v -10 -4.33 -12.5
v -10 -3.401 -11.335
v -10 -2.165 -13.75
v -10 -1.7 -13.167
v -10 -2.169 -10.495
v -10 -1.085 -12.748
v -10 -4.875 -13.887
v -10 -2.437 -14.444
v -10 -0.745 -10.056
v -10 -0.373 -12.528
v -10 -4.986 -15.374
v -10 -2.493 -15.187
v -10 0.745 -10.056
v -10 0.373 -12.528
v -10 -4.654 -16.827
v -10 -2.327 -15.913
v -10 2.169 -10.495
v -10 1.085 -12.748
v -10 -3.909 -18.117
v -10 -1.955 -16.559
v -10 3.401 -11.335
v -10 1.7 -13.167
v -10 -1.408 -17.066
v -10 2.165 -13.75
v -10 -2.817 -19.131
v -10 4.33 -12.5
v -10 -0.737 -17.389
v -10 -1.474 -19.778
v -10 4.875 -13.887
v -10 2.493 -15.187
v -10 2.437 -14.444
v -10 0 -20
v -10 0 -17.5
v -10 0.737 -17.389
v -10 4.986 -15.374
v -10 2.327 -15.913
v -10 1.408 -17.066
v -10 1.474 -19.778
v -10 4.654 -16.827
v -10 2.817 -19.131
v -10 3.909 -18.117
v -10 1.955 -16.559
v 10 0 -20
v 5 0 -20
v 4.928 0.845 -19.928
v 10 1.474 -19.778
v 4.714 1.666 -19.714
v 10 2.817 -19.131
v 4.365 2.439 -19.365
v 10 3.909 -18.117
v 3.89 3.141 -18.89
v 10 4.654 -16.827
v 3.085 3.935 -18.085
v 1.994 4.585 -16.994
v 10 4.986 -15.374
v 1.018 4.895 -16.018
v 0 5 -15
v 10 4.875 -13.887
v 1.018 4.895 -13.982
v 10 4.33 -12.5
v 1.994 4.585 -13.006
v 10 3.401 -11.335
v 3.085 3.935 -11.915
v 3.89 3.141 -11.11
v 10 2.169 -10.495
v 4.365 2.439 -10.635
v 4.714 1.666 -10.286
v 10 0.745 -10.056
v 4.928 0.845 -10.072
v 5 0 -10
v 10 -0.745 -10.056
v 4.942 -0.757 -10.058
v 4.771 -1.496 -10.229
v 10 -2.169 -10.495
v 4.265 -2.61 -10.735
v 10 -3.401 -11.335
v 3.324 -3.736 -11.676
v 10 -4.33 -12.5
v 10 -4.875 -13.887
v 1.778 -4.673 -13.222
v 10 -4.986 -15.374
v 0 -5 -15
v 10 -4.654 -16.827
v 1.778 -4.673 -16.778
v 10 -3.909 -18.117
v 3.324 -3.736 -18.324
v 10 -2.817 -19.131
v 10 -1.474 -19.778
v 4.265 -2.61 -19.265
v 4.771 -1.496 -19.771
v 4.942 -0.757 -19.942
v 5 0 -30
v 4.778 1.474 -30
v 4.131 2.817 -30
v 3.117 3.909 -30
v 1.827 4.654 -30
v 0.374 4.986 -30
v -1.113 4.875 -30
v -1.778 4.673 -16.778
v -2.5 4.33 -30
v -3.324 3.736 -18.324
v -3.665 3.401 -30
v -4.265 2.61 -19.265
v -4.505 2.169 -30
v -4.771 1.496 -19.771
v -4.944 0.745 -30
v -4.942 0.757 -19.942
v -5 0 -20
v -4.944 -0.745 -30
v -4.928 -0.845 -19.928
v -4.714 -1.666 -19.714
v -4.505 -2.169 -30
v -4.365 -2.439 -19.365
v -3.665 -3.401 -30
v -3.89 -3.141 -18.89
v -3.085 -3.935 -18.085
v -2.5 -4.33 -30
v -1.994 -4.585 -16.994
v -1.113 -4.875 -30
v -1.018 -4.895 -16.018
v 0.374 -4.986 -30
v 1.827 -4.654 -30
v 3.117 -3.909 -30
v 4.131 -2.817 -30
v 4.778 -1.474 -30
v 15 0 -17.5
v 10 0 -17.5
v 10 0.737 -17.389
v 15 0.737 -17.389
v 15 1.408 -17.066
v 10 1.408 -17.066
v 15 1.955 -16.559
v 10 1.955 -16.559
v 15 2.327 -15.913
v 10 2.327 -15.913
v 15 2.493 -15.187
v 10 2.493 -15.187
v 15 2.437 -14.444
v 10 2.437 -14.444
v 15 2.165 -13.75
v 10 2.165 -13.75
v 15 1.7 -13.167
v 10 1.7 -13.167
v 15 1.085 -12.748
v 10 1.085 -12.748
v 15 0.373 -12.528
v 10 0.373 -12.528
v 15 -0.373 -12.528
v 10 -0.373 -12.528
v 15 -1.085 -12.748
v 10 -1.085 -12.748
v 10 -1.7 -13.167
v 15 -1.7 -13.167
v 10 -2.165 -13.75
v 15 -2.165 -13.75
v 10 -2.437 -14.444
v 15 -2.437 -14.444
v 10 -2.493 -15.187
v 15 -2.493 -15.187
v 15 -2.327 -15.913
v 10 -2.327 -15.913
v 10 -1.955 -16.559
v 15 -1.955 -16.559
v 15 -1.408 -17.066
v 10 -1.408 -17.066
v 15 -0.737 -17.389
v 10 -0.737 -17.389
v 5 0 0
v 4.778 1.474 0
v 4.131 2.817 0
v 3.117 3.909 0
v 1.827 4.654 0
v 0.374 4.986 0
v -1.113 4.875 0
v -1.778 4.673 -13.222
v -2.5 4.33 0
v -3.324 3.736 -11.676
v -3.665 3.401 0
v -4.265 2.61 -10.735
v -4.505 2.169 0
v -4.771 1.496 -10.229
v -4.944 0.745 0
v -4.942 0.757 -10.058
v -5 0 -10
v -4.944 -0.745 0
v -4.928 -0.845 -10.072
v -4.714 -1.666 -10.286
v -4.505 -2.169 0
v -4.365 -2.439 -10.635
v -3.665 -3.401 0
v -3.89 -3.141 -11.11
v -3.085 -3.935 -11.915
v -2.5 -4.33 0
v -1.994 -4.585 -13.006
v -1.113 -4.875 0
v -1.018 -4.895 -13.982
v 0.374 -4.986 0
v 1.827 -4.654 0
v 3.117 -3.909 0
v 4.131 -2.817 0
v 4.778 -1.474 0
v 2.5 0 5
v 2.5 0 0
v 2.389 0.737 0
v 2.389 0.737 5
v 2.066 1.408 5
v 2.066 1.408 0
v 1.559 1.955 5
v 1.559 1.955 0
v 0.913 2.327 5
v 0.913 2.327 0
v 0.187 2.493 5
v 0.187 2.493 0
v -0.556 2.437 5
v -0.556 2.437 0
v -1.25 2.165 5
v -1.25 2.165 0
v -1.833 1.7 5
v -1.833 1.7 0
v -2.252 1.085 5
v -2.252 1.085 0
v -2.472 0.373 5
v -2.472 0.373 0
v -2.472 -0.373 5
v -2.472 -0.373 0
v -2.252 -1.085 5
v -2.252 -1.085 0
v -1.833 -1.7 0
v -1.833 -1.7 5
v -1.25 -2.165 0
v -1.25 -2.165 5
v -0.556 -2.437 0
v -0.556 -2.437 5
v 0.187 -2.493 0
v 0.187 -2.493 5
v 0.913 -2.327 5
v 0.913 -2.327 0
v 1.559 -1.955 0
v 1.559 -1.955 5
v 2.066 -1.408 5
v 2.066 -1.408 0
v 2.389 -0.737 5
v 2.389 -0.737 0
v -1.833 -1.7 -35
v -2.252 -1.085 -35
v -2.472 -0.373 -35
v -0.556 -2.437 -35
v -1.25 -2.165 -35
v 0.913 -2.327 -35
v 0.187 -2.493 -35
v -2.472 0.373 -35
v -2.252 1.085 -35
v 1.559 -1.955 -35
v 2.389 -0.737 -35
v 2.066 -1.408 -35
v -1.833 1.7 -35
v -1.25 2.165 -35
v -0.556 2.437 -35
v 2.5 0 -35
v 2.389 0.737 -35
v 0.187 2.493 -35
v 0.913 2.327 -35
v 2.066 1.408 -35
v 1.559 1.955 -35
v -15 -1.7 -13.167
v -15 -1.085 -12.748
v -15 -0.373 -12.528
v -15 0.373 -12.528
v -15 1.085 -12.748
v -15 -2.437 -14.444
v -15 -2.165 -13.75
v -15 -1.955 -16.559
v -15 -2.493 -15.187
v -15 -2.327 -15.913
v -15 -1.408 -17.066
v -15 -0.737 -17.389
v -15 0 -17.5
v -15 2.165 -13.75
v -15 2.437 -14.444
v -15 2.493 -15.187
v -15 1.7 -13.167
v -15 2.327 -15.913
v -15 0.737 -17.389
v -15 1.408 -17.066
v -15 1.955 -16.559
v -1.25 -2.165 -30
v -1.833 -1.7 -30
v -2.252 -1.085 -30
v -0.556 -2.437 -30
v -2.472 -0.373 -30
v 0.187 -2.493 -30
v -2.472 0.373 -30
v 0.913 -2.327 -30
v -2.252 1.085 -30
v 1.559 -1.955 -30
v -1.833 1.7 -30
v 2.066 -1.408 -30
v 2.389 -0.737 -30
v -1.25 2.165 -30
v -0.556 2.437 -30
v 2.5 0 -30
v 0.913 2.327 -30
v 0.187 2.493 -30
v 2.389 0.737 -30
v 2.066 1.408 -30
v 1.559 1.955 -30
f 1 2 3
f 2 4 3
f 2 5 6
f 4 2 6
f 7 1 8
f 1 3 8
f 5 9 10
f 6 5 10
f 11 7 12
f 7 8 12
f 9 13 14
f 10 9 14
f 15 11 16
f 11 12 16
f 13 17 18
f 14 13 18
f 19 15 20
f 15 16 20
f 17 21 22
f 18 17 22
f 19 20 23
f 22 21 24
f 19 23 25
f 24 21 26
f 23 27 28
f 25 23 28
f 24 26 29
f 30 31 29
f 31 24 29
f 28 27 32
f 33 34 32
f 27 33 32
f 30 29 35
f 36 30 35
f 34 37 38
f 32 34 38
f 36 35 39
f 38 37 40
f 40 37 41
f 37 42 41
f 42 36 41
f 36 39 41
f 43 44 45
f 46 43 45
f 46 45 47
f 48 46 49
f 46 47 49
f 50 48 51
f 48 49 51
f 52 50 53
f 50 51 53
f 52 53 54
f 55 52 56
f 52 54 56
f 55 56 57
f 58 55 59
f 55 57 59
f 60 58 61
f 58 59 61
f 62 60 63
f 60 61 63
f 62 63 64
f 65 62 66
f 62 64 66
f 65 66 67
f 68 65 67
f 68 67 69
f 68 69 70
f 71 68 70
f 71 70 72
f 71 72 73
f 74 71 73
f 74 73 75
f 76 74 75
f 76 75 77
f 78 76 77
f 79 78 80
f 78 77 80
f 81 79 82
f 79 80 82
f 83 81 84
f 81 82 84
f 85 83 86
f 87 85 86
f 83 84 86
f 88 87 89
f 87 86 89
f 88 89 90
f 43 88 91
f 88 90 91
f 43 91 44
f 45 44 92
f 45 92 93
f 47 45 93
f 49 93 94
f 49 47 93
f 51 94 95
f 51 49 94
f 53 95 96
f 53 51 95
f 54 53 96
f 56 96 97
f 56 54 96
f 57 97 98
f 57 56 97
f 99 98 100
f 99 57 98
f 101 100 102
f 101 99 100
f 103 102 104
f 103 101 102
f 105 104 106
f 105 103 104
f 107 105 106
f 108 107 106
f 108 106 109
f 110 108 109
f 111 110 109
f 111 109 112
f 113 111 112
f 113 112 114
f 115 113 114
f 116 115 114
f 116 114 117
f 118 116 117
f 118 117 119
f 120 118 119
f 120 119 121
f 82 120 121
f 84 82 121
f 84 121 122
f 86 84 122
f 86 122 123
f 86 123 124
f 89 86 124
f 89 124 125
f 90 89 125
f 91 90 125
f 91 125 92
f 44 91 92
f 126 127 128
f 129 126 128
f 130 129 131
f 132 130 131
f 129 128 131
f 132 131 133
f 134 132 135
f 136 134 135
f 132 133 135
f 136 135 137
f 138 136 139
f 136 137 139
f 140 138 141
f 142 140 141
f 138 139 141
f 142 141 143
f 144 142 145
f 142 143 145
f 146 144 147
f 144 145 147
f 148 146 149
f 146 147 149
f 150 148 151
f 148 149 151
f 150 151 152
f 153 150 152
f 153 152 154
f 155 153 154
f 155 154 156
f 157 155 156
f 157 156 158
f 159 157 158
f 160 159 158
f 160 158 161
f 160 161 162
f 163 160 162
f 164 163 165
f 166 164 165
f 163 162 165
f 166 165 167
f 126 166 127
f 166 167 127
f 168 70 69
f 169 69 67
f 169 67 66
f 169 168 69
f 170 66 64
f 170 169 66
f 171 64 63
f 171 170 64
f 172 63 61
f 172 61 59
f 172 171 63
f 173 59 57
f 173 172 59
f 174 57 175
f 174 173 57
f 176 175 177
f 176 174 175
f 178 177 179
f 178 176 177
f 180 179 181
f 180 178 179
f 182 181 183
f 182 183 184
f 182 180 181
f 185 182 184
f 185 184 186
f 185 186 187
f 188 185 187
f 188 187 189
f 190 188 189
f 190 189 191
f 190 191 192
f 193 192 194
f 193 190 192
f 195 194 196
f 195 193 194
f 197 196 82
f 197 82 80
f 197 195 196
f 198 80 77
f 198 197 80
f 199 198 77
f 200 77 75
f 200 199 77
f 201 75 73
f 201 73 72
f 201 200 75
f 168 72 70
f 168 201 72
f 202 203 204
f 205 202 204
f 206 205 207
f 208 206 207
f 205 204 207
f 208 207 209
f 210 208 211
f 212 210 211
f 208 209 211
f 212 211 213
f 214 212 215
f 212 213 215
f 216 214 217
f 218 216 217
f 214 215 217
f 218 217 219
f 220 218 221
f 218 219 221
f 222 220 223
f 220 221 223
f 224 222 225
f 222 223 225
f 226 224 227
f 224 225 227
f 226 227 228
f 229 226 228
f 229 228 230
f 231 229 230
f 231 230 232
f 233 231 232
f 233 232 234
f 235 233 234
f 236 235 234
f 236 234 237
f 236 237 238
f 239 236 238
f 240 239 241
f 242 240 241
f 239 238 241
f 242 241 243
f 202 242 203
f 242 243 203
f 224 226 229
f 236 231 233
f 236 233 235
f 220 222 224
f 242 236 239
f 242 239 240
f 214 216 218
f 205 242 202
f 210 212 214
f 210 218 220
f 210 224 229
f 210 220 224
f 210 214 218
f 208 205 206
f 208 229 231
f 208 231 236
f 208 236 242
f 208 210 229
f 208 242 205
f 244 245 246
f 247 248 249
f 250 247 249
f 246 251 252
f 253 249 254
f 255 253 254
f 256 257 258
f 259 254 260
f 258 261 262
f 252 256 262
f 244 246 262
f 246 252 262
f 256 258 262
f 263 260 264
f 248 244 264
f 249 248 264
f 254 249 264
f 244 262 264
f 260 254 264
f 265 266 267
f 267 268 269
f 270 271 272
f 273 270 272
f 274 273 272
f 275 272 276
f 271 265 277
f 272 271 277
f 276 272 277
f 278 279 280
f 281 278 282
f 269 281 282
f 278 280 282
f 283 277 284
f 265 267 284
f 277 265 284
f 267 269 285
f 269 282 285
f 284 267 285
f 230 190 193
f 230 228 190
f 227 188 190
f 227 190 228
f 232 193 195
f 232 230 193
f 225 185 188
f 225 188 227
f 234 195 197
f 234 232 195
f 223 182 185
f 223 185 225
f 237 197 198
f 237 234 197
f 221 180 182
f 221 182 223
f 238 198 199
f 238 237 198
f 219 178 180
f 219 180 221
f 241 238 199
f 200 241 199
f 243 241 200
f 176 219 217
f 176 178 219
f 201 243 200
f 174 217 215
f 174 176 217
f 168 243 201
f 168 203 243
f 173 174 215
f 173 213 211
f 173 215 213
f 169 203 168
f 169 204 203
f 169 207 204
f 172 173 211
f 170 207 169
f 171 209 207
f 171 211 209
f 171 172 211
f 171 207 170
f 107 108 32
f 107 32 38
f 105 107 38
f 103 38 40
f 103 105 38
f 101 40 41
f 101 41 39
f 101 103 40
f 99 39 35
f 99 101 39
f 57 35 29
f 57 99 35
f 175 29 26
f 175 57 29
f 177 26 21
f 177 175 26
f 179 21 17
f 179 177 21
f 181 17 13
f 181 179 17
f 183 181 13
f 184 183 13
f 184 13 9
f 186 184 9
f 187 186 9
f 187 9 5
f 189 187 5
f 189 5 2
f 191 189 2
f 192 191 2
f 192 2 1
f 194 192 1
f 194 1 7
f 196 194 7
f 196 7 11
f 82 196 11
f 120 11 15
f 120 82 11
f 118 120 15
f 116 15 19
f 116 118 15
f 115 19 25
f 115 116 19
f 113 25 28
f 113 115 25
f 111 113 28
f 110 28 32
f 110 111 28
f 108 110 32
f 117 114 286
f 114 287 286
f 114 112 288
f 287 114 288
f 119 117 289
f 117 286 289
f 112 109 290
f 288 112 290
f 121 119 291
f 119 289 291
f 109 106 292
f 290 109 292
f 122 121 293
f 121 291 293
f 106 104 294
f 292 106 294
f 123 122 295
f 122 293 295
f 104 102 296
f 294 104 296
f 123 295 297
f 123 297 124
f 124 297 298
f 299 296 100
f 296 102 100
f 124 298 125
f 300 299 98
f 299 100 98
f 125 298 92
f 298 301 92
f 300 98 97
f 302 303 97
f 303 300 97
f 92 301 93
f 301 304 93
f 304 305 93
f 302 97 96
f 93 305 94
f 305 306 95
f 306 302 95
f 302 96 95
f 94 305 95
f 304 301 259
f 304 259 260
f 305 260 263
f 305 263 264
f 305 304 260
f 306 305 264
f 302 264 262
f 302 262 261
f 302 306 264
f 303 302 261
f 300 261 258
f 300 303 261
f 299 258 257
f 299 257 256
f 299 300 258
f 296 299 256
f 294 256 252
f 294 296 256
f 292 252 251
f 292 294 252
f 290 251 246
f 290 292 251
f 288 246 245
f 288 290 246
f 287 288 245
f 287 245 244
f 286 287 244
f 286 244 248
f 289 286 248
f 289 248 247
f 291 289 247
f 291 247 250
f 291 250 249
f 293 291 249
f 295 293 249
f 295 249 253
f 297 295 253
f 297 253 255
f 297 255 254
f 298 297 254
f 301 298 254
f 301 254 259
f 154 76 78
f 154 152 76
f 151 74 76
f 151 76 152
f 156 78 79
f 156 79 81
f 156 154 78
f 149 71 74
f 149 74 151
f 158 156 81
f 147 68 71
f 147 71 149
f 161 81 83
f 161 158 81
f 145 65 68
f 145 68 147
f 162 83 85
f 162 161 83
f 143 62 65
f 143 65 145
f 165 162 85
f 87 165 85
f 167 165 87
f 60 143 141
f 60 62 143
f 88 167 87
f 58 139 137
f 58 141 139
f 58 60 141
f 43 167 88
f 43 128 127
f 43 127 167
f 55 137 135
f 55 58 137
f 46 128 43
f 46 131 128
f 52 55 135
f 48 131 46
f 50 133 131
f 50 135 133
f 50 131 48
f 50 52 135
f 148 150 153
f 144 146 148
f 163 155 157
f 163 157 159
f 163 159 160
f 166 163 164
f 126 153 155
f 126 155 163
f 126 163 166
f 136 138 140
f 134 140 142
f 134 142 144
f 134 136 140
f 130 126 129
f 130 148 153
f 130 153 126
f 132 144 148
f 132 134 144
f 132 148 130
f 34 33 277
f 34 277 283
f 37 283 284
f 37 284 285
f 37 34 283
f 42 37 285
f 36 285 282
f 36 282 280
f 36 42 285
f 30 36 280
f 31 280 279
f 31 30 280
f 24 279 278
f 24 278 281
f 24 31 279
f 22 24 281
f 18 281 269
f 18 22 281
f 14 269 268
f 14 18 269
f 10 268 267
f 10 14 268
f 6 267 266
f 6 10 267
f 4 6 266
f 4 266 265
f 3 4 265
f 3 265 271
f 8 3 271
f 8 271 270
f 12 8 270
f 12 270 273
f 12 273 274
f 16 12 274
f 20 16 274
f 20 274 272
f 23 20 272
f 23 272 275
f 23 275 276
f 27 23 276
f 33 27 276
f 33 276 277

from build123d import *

# Parameters (mm, degrees)
SKETCH1_R                = 5
BOSS_EXTRUDE1_DEPTH      = 30
BOSS_EXTRUDE2_DEPTH      = 10
BOSS_EXTRUDE2_DEPTH_BACK = 10
SKETCH3_R                = 5
BOSS_EXTRUDE3_DEPTH      = 5
BOSS_EXTRUDE3_DEPTH_BACK = 25
SKETCH5_R                = 2.5
BOSS_EXTRUDE4_DEPTH      = 5
BOSS_EXTRUDE4_DEPTH_BACK = 35
SKETCH6_R                = 2.5


with BuildPart() as part:
    # Sketch1 → Boss-Extrude1 (new body)
    with BuildSketch(Plane.XY):
        Circle(SKETCH1_R)
    extrude(amount=-BOSS_EXTRUDE1_DEPTH)

    # Sketch3 → Boss-Extrude2 (add, two sides: drawn at the far end of the back side and taken through both)
    with BuildSketch(Plane(origin=(0, 0, 0), x_dir=(0, 0, -1), z_dir=(1, 0, 0)).offset(-BOSS_EXTRUDE2_DEPTH_BACK)):
        with Locations((15, 0)):
            Circle(SKETCH3_R)
    extrude(amount=BOSS_EXTRUDE2_DEPTH + BOSS_EXTRUDE2_DEPTH_BACK)

    # Sketch5 → Boss-Extrude3 (add, two sides: drawn at the far end of the back side and taken through both)
    with BuildSketch(Plane(origin=(10, 0, 0), x_dir=(0, 0, -1), z_dir=(1, 0, 0)).offset(-BOSS_EXTRUDE3_DEPTH_BACK)):
        with Locations((15, 0)):
            Circle(SKETCH5_R)
    extrude(amount=BOSS_EXTRUDE3_DEPTH + BOSS_EXTRUDE3_DEPTH_BACK)

    # Sketch6 → Boss-Extrude4 (add, two sides: drawn at the far end of the back side and taken through both)
    with BuildSketch(Plane.XY.offset(-BOSS_EXTRUDE4_DEPTH_BACK)):
        Circle(SKETCH6_R)
    extrude(amount=BOSS_EXTRUDE4_DEPTH + BOSS_EXTRUDE4_DEPTH_BACK)


solid = part.part
